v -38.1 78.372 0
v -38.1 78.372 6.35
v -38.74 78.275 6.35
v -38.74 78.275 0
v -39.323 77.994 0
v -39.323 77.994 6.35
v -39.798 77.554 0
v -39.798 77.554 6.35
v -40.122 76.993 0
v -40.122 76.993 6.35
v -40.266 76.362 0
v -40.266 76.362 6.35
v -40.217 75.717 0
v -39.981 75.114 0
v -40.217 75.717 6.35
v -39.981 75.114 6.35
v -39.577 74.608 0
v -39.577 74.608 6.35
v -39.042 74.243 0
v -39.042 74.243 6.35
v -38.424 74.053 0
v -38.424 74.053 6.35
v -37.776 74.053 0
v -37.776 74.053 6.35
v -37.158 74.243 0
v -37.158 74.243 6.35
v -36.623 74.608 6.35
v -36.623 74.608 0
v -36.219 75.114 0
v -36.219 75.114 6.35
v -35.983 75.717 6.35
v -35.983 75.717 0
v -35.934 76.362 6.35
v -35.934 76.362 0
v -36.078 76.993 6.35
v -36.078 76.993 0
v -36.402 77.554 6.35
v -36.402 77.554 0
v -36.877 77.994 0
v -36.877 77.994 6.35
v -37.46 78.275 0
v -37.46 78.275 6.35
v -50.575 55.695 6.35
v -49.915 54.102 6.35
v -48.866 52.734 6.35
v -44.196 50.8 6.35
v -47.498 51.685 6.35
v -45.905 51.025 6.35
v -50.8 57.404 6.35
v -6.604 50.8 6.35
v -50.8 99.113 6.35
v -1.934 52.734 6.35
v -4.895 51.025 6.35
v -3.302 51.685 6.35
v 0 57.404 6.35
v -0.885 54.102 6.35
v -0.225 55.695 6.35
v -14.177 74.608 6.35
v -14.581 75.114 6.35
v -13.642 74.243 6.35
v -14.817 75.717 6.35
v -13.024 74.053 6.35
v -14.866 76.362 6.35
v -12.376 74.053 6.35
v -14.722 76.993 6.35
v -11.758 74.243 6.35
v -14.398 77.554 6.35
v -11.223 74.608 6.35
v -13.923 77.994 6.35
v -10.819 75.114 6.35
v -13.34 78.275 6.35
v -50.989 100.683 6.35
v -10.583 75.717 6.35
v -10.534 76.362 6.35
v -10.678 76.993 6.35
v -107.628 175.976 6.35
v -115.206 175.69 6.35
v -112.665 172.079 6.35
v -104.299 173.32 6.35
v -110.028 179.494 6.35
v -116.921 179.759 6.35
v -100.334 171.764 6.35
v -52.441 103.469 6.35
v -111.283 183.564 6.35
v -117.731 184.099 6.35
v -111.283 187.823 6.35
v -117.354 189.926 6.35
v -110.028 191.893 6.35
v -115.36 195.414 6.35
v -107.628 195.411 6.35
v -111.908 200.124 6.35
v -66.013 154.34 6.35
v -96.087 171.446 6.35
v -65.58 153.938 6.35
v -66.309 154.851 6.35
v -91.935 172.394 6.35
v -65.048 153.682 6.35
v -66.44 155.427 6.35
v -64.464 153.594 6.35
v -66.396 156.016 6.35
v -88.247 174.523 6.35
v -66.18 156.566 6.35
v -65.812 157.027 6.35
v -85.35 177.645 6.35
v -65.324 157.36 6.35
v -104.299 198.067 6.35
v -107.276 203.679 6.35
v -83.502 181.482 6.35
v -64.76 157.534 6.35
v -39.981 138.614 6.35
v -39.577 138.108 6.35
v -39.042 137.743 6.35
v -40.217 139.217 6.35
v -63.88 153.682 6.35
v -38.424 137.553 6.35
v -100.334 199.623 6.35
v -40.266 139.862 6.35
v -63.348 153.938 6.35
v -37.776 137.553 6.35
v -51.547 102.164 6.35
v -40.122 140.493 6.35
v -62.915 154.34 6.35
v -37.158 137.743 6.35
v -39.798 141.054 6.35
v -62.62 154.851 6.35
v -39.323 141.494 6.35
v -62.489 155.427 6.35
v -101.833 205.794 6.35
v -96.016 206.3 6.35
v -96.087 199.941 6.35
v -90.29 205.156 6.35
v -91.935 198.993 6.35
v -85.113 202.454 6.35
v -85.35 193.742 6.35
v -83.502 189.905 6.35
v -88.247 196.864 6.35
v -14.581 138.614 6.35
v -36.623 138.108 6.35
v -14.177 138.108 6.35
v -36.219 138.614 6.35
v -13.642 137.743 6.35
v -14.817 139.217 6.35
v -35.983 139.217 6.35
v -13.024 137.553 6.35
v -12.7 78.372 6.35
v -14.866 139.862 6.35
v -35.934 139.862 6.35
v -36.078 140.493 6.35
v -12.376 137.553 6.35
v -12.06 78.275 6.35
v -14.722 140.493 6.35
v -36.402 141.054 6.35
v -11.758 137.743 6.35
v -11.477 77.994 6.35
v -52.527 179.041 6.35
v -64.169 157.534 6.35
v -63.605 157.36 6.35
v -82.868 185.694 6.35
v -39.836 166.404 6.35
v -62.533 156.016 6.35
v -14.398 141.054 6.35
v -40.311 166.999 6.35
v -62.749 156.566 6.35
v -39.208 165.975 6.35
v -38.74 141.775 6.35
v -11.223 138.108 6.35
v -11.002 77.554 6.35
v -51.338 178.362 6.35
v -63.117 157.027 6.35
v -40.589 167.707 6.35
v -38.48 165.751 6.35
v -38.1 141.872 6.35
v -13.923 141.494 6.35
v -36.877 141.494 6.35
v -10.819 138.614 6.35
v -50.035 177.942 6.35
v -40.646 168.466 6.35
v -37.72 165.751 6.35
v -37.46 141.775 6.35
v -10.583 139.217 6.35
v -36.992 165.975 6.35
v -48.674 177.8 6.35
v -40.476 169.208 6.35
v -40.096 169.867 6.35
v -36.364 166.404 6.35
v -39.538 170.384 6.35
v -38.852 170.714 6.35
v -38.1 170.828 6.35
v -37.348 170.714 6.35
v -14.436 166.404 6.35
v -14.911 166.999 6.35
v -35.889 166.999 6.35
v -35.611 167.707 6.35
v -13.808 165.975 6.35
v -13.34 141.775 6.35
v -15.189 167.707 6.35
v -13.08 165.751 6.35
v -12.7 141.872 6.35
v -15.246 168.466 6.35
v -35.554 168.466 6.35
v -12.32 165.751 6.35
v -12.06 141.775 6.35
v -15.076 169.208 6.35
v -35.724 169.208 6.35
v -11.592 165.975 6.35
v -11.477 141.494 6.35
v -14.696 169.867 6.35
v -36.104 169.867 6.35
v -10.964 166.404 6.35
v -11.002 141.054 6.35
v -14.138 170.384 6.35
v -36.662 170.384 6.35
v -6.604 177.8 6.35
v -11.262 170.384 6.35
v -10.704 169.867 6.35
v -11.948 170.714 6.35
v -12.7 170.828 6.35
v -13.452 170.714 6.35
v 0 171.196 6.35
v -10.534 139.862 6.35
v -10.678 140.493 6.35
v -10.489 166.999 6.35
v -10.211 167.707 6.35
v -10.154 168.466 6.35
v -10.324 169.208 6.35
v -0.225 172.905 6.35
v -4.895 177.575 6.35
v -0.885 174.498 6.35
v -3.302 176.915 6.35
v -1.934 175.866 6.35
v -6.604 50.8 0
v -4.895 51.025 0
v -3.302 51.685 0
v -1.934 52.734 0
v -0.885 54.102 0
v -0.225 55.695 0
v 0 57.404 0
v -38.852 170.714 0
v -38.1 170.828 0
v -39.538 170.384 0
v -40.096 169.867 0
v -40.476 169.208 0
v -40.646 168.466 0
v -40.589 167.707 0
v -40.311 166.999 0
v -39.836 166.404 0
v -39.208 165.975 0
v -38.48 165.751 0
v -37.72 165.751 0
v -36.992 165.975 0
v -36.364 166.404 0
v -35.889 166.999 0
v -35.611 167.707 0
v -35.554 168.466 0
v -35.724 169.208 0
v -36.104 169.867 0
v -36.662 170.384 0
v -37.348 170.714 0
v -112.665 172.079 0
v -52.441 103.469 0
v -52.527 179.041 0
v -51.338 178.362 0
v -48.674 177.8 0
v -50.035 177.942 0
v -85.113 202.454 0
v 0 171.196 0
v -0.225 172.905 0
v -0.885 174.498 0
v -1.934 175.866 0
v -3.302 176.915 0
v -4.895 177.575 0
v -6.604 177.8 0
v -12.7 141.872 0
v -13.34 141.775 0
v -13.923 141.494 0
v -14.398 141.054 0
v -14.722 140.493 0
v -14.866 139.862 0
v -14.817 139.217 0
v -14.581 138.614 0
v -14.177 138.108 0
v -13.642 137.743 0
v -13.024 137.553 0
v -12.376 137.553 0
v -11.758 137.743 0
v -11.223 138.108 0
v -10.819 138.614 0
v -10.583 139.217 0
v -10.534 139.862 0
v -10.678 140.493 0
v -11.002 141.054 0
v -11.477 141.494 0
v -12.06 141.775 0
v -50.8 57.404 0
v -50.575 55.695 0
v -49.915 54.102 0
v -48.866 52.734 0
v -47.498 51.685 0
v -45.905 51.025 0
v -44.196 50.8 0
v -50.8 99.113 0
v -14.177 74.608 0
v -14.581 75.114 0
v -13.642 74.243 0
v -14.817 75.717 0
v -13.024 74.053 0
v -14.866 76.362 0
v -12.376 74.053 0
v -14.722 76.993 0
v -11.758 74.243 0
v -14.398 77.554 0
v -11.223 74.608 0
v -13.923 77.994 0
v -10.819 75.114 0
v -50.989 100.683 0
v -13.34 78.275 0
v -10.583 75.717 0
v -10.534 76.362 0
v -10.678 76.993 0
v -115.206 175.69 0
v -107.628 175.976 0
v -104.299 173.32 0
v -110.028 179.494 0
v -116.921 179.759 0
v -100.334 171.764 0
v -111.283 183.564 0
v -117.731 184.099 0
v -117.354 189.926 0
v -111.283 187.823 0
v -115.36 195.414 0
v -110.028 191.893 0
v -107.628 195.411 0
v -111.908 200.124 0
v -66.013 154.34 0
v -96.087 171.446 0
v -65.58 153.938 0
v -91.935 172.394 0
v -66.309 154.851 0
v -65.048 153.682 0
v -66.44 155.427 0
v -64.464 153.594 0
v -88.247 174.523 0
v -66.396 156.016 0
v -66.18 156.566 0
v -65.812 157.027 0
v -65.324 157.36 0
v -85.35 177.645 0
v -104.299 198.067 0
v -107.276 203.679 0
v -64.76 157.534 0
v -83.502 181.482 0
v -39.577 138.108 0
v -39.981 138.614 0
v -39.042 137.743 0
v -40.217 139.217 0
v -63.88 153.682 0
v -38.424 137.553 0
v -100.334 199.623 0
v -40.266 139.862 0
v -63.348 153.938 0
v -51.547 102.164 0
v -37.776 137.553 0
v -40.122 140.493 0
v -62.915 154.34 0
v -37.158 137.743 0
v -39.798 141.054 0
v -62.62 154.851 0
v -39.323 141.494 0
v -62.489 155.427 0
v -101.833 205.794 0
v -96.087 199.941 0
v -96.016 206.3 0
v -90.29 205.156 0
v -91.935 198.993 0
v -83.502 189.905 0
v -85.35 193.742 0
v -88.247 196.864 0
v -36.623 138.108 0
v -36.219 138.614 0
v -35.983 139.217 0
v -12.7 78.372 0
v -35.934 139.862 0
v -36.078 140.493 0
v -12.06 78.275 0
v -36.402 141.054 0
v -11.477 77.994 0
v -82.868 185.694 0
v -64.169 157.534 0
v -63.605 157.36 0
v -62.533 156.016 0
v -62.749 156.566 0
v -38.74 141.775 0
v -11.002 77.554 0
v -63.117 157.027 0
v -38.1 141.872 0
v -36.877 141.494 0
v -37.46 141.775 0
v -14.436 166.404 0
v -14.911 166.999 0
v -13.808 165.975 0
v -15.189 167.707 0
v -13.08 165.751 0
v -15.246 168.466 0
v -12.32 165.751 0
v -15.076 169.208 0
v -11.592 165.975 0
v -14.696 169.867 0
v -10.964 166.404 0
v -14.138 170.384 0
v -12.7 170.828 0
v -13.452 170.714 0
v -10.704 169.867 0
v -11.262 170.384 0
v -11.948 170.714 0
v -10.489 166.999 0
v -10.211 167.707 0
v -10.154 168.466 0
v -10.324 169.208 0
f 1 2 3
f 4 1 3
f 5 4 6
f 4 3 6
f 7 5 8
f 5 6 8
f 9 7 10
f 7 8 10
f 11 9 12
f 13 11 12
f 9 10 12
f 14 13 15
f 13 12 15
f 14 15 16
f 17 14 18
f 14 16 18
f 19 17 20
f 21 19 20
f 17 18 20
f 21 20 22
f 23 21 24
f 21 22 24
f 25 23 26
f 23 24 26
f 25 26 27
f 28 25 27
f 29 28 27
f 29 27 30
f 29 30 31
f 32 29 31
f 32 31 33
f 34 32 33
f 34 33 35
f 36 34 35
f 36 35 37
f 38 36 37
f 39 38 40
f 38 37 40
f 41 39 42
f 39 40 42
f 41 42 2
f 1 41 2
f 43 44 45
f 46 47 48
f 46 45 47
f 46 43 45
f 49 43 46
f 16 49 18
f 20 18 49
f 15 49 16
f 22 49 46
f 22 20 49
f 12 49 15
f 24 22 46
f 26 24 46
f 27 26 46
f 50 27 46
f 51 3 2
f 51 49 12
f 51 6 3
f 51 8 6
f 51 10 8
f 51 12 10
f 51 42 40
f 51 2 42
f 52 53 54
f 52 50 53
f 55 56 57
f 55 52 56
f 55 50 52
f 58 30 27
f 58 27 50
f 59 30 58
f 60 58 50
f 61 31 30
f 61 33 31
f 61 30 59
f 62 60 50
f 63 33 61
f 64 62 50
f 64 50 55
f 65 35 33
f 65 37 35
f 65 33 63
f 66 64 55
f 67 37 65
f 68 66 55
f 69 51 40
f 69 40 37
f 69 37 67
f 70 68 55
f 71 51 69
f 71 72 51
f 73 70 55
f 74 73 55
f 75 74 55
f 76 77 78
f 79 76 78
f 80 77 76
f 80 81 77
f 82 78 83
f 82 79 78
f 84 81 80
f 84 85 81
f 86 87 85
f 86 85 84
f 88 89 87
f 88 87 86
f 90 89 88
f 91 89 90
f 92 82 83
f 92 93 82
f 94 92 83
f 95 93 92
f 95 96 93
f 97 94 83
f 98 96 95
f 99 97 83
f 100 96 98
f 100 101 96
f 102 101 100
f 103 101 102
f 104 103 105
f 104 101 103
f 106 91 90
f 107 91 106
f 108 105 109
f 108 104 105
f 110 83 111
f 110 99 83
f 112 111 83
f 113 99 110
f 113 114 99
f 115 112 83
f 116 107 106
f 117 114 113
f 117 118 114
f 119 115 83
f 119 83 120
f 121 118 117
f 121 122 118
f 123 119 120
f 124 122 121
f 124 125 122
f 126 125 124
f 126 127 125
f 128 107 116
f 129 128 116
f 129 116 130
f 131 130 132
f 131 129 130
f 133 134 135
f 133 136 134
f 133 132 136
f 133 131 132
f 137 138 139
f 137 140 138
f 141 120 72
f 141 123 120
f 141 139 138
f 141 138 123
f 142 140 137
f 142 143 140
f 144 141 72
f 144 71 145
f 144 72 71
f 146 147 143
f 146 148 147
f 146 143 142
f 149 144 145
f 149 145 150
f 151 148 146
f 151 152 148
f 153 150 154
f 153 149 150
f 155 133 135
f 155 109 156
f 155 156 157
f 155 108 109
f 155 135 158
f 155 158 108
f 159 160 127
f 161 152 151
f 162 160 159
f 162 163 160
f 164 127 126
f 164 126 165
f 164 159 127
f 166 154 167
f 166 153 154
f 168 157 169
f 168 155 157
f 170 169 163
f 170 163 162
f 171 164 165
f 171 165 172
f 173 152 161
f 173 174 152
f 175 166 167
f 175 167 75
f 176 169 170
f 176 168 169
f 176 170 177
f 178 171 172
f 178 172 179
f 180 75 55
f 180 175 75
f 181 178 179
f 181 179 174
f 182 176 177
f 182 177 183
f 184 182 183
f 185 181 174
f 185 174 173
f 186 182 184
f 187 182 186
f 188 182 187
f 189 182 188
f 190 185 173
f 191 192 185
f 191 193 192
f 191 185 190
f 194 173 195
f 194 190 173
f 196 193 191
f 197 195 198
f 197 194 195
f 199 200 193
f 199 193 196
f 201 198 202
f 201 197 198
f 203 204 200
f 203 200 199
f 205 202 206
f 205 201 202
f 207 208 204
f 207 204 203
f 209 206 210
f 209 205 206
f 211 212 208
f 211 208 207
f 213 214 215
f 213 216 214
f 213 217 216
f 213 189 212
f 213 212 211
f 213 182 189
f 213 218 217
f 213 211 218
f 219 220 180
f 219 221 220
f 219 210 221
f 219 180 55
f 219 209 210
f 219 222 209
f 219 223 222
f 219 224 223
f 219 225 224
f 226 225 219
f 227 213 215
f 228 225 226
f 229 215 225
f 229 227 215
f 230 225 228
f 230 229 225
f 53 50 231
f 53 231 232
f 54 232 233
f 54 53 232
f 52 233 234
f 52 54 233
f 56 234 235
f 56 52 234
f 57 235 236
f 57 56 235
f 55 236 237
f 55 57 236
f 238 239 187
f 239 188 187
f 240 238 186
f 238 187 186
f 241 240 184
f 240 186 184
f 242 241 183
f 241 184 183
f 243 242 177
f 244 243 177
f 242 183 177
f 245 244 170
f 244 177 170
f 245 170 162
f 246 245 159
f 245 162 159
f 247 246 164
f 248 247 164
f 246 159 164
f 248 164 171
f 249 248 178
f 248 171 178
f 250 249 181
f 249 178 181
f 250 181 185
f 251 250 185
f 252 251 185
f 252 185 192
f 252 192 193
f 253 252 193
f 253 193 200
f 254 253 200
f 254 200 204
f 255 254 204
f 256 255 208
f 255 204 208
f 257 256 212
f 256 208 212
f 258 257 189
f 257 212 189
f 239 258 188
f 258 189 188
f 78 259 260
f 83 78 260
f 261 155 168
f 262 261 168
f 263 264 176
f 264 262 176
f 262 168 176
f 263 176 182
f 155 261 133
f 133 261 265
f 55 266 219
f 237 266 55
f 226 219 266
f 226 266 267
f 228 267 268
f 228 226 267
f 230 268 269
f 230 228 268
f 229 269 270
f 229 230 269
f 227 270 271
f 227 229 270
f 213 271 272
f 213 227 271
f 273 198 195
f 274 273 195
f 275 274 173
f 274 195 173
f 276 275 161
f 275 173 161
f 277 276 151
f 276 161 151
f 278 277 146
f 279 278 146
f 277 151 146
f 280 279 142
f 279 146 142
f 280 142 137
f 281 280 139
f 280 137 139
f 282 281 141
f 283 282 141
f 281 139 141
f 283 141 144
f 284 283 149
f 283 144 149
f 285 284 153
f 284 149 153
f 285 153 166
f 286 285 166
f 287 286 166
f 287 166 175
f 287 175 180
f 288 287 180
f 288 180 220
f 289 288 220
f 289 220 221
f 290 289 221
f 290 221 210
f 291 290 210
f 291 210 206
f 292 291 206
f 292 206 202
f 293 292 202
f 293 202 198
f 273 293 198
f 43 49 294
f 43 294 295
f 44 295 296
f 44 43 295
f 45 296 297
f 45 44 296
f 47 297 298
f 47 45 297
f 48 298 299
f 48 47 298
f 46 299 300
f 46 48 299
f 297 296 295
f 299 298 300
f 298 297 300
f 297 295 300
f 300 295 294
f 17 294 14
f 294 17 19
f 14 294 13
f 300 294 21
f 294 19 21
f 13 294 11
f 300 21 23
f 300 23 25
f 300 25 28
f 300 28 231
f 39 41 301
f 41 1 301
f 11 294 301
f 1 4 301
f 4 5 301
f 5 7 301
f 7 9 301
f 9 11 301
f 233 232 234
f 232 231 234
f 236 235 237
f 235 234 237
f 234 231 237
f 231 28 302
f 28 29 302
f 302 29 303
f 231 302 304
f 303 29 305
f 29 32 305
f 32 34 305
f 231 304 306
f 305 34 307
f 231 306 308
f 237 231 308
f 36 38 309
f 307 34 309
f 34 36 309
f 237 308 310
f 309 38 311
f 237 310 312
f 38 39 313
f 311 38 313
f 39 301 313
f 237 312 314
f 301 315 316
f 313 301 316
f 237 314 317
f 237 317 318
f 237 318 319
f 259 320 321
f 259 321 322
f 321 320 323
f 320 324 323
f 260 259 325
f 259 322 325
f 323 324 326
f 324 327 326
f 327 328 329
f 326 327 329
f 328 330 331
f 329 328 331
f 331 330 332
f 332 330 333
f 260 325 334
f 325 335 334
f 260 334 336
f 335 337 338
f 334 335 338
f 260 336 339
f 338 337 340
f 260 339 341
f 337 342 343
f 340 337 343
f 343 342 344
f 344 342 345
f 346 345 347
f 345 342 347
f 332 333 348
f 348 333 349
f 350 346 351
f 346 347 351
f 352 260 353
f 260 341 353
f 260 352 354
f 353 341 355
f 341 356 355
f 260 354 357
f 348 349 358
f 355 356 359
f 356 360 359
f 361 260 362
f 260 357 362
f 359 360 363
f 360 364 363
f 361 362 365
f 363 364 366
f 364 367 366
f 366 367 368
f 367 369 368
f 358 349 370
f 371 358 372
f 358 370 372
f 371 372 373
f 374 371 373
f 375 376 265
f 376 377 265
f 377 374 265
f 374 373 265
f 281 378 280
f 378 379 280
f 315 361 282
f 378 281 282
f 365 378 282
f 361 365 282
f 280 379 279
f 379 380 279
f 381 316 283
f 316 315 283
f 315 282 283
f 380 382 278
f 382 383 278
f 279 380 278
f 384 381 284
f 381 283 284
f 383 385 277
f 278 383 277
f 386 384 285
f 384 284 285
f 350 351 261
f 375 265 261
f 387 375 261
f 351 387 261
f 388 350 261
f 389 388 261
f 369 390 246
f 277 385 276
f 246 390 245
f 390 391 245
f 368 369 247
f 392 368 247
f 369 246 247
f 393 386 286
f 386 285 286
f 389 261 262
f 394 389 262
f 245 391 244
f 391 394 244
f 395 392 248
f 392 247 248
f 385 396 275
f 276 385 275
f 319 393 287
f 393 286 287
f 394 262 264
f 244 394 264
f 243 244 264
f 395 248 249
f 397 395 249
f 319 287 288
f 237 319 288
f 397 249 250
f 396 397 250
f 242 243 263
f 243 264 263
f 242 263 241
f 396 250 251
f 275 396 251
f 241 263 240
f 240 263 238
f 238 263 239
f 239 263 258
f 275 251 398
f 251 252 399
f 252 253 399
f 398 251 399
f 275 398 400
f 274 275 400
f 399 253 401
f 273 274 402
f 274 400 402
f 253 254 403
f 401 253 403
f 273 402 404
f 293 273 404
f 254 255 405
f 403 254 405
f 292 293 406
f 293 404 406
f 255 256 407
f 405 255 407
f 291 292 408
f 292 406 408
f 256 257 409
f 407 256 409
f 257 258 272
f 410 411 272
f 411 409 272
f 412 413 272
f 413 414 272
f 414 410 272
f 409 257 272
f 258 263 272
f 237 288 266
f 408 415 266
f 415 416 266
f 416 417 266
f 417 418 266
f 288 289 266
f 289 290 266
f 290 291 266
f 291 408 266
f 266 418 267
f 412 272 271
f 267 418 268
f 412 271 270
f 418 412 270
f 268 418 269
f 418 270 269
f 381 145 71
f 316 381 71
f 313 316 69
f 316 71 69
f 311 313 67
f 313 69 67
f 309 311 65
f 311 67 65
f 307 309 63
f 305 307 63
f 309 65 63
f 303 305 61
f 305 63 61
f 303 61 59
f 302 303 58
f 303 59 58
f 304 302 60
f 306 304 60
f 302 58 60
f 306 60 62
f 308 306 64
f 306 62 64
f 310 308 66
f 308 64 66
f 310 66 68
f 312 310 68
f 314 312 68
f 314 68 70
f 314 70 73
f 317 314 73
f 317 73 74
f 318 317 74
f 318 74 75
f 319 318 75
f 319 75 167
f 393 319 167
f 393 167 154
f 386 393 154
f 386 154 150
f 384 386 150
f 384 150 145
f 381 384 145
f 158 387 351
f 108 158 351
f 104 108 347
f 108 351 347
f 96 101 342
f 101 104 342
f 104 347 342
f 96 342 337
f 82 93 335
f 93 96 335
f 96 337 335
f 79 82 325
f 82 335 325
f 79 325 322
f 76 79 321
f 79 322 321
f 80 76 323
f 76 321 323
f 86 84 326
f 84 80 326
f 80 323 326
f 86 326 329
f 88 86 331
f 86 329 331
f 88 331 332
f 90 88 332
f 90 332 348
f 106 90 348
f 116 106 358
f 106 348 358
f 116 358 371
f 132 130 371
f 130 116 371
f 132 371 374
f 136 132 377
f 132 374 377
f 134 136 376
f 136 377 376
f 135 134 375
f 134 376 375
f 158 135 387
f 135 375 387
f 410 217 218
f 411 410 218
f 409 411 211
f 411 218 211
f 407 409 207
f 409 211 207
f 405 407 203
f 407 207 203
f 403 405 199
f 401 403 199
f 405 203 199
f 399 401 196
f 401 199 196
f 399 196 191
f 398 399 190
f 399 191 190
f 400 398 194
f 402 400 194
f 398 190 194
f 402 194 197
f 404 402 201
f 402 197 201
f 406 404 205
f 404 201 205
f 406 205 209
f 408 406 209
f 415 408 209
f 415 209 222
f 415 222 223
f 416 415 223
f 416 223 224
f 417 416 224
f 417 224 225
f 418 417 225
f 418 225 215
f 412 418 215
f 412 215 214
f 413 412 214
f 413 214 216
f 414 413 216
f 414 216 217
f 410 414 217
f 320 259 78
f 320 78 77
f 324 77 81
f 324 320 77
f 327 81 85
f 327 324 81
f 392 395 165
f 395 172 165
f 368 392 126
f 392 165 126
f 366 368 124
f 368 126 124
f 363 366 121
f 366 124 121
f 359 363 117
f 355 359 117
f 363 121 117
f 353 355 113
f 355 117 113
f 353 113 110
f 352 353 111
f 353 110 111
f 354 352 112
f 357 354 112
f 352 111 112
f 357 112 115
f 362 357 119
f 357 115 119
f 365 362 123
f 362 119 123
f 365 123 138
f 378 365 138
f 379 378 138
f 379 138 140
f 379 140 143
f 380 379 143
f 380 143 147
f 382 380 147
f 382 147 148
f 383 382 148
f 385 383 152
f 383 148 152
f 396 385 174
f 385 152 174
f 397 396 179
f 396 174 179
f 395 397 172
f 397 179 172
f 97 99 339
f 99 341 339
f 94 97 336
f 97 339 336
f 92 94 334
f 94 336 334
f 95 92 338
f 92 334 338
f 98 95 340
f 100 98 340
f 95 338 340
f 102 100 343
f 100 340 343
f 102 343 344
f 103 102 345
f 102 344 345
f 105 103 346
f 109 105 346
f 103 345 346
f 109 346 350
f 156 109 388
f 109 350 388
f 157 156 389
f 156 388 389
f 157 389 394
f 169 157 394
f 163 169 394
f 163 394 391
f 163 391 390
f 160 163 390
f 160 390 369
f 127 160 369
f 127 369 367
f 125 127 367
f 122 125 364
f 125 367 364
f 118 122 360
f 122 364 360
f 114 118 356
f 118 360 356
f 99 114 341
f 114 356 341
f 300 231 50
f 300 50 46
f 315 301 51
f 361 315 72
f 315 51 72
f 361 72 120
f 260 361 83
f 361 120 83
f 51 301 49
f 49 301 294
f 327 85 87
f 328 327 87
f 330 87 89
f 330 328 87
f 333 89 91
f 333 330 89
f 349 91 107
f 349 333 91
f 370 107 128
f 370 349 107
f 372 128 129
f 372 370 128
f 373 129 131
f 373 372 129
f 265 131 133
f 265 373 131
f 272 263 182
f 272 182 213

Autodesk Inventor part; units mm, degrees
ref_plane "YZ Plane" through (0, 0, 0) normal (1, 0, 0) x (0, 1, 0)
ref_plane "XZ Plane" through (0, 0, 0) normal (0, 1, 0) x (-1, 0, 0)
ref_plane "XY Plane" through (0, 0, 0) normal (0, 0, 1) x (1, 0, 0)
sketch "Sketch1" plane through (0, 0, 0) normal (0, 0, 1) x (1, 0, 0)
  line L0 (0, 0) -> (-50.8, 0) construction
  line L1 (-50.8, 0) -> (-50.8, 381) construction
  line L2 (-50.8, 381) -> (0, 381) construction
  line L3 (0, 381) -> (0, 0) construction
  circle A0 centre (-50.8, 431.8) radius 11.1125 construction
  line L4 (-50.8, 353.7099) -> (-298.4703, 0) construction
  line L5 (-298.4703, 0) -> (-267.4626, 0) construction
  line L6 (-267.4626, 0) -> (-50.8, 309.4263) construction
  dimension "d0" = 50.8
  dimension "d1" = 381
  dimension "d2" = 22.225
  dimension "d3" = 431.8
  dimension "d4" = 50.8
  dimension "d5" = 431.8
  dimension "d6" = 25.4
  dimension "d7" = 35
sketch "Sketch2" plane through (0, 0, 0) normal (0, 0, 1) x (1, 0, 0)
  line L0 (-267.4626, 0) -> (-50.8, 309.4263) construction
  line L1 (-50.8, 353.7099) -> (-298.4703, 0) construction
  line L2 (-50.8, 0) -> (-50.8, 381) construction
  line L3 (0, 381) -> (0, 0) construction
  line L4 (-50.8, 381) -> (0, 381) construction
  circle A0 centre (-50.8, 431.8) radius 11.1125 construction
  line L5 (0, 0) -> (-50.8, 0) construction
  line L6 (-298.4703, 0) -> (-267.4626, 0) construction
  circle A1 centre (-88.9, 38.1) radius 30.48 construction
  circle A2 centre (-88.9, 38.1) radius 6.35 construction
  circle A3 centre (-124.3919, 76.2) radius 45.72 construction
  circle A4 centre (-124.3919, 76.2) radius 11.43 construction
  circle A5 centre (-101.6, 129.9906) radius 46.99 construction
  circle A6 centre (-101.6, 129.9906) radius 12.7 construction
  circle A7 centre (-97.155, 185.6935) radius 43.18 construction
  circle A8 centre (-124.3919, 76.2) radius 14.2875
  circle A9 centre (-101.6, 129.9906) radius 14.2875
  circle A10 centre (-97.155, 185.6935) radius 14.2875
  circle A11 centre (-50.8, 431.8) radius 54.5719 construction
  line L7 (-50.8, 177.8) -> (0, 177.8)
  circle A12 centre (-97.155, 185.6935) radius 20.6375 construction
  circle A13 centre (-101.6, 129.9906) radius 20.6375 construction
  circle A14 centre (-124.3919, 76.2) radius 20.6375 construction
  circle A15 centre (-88.9, 38.1) radius 25.4 construction
  line L8 (-50.8, 177.8) -> (-85.1131, 202.4536)
  line L9 (-141.8793, 65.2411) -> (-114.7275, 21.9145)
  line L10 (-74.6041, 11.1805) -> (0, 50.8)
  line L11 (0, 177.8) -> (0, 50.8)
  arc A16 (-141.8226, 87.2489) -> (-117.7308, 184.0988) centre (-275.3417, 171.8837) ccw
  arc A17 (-85.1131, 202.4536) -> (-117.7308, 184.0988) centre (-97.155, 185.6935) ccw
  arc A18 (-141.8226, 87.2489) -> (-141.8793, 65.2411) centre (-124.3919, 76.2) ccw
  arc A19 (-114.7275, 21.9145) -> (-74.6041, 11.1805) centre (-88.9, 38.1) ccw
  line L12 (-38.1, 152.4) -> (-38.1, 127) construction
  line L13 (-40.6527, 152.4) -> (-40.6527, 127)
  line L14 (-35.5473, 127) -> (-35.5473, 152.4)
  arc A20 (-35.5473, 152.4) -> (-40.6527, 152.4) centre (-38.1, 152.4) ccw
  arc A21 (-40.6527, 127) -> (-35.5473, 127) centre (-38.1, 127) ccw
  line L15 (-12.7, 152.4) -> (-12.7, 127) construction
  line L16 (-15.2527, 152.4) -> (-15.2527, 127)
  line L17 (-10.1473, 127) -> (-10.1473, 152.4)
  arc A22 (-10.1473, 152.4) -> (-15.2527, 152.4) centre (-12.7, 152.4) ccw
  arc A23 (-15.2527, 127) -> (-10.1473, 127) centre (-12.7, 127) ccw
  line L18 (-38.1, 139.7) -> (-12.7, 139.7) construction
  line L19 (-38.1, 88.9) -> (-38.1, 63.5) construction
  line L20 (-40.6527, 88.9) -> (-40.6527, 63.5)
  line L21 (-35.5473, 63.5) -> (-35.5473, 88.9)
  arc A24 (-35.5473, 88.9) -> (-40.6527, 88.9) centre (-38.1, 88.9) ccw
  arc A25 (-40.6527, 63.5) -> (-35.5473, 63.5) centre (-38.1, 63.5) ccw
  line L22 (-12.7, 88.9) -> (-12.7, 63.5) construction
  line L23 (-15.2527, 88.9) -> (-15.2527, 63.5)
  line L24 (-10.1473, 63.5) -> (-10.1473, 88.9)
  arc A26 (-10.1473, 88.9) -> (-15.2527, 88.9) centre (-12.7, 88.9) ccw
  arc A27 (-15.2527, 63.5) -> (-10.1473, 63.5) centre (-12.7, 63.5) ccw
  line L25 (-38.1, 76.2) -> (-12.7, 76.2) construction
  circle A28 centre (-88.9, 38.1) radius 10.795
  line L26 (-112.6649, 172.0793) -> (-50.8, 101.6)
  line L27 (-50.8, 101.6) -> (-50.8, 23.822)
  arc A29 (-117.7308, 184.0988) -> (-112.6649, 172.0793) centre (-97.155, 185.6935) ccw
  line L28 (0, 50.8) -> (-50.8, 50.8)
  point P0 (-88.9, 63.5)
  point P1 (-110.897, 50.8)
  point P2 (-110.897, 25.4)
  point P3 (-88.9, 12.7)
  point P4 (-66.903, 25.4)
  point P5 (-66.903, 50.8)
  point P6 (-25.4, 139.7)
  point P7 (-25.4, 177.8)
  point P8 (-25.4, 76.2)
  point P9 (-38.1, 168.275)
  point P10 (-12.7, 168.275)
  dimension "d25" = 50.8
  dimension "d8" = 60.96
  dimension "d9" = 12.7
  dimension "d10" = 91.44
  dimension "d11" = 38.1
  dimension "d12" = 38.1
  dimension "d13" = 22.86
  dimension "d14" = 93.98
  dimension "d15" = 25.4
  dimension "d16" = 86.36
  dimension "d17" = 76.2
  dimension "d20" = 50.8
  dimension "d22" = 28.575
  dimension "d23" = 109.1438
  dimension "d24" = 6.35
  dimension "d28" = 360
  dimension "d30" = 177.8
  dimension "d31" = 50.8
  dimension "d32" = 5.1054
  dimension "d33" = 25.4
  dimension "d34" = 38.1
  dimension "d35" = 25.4
  dimension "d36" = 5.1054
  dimension "d37" = 25.4
  dimension "d38" = 25.4
  dimension "d39" = 63.5
  dimension "d42" = 21.59
  dimension "d50" = 9.525
  dimension "d59" = 46.355
  dimension "d87" = 76.2
extrude "Extrusion1" add sketch "Sketch2" along normal blind 6.35 contours L7 L11 L28 L27 L26 A29 A17 L8 | A20 L14 A21 L13 | A22 L17 A23 L16 | A24 L21 A25 L20 | A26 L24 A27 L23
hole "Hole1" at (-88.9, 63.5, 0) at (-110.897, 50.8, 0) at (-110.897, 25.4, 0) at (-88.9, 12.7, 0) at (-66.903, 25.4, 0) at (-66.903, 50.8, 0) at (-38.1, 168.275, 0) at (-12.7, 168.275, 0) direction (0, 0, 1) diameter 5.1054 end through all clearance for "Flat Head Machine Screw (82)" size "#10" standard "Ansi Unified Screw Threads"
hole "Hole2" at (-12.7, 139.7, 0) at (-38.1, 139.7, 0) at (-38.1, 76.2, 0) at (-12.7, 76.2, 0) direction (0, 0, 1) diameter 4.3434 end through all thread size "12-24 UNC" class "2B" standard "ANSI Unified Screw Threads"
fillet "Fillet1" radius 6.604 3 edges at (-50.8, 177.8, 3.175) (0, 177.8, 3.175) (0, 50.8, 3.175)
sketch "Sketch4" plane through (0, 0, 6.35) normal (0, 0, 1) x (1, 0, 0)
  arc A0 (-6.604, 50.8) -> (0, 57.404) centre (-6.604, 57.404) ccw construction
  line L0 (0, 57.404) -> (0, 171.196) construction
  arc A1 (0, 171.196) -> (-6.604, 177.8) centre (-6.604, 171.196) ccw construction
  line L1 (-6.604, 177.8) -> (-48.6735, 177.8) construction
  arc A2 (-52.5269, 179.0408) -> (-48.6735, 177.8) centre (-48.6735, 184.404) ccw construction
  line L2 (-52.5269, 179.0408) -> (-85.1131, 202.4536) construction
  arc A3 (-85.1131, 202.4536) -> (-112.6649, 172.0793) centre (-97.155, 185.6935) ccw construction
  circle A4 centre (-38.1, 76.2) radius 2.1717 construction
  circle A5 centre (-12.7, 139.7) radius 2.1717 construction
  circle A6 centre (-38.1, 139.7) radius 2.1717 construction
  circle A7 centre (-12.7, 76.2) radius 2.1717 construction
  circle A8 centre (-38.1, 168.275) radius 2.5527 construction
  circle A9 centre (-12.7, 168.275) radius 2.5527 construction
  circle A10 centre (-97.155, 185.6935) radius 14.2875 construction
  line L3 (-112.6649, 172.0793) -> (-50.8, 101.6) projected
  line L4 (-50.8, 101.6) -> (-50.8, 50.8) projected
  line L5 (-50.8, 50.8) -> (-6.604, 50.8) projected
  point P0 (0, 0)
  point P1 (-64.4644, 155.575)
  dimension "d74" = 44.45
  dimension "d75" = 22.225
hole "Hole3" at (-64.4644, 155.575, 6.35) direction (0, 0, -1) diameter 3.9624 end through all thread size "10-32 UNF" class "2B" standard "ANSI Unified Screw Threads"
fillet "Fillet3" radius 6.604 2 edges at (-50.8, 50.8, 3.175) (-50.8, 101.6, 3.175)
sketch "Sketch3" plane through (0, 0, 6.35) normal (0, 0, 1) x (1, 0, 0)
  arc A0 (-3.5066, 48.9378) -> (0, 54.7703) centre (-6.604, 54.7703) ccw construction
  line L0 (0, 54.7703) -> (0, 171.196) construction
  arc A1 (0, 171.196) -> (-6.604, 177.8) centre (-6.604, 171.196) ccw construction
  line L1 (-6.604, 177.8) -> (-48.6735, 177.8) construction
  arc A2 (-52.5269, 179.0408) -> (-48.6735, 177.8) centre (-48.6735, 184.404) ccw construction
  line L2 (-52.5269, 179.0408) -> (-85.1131, 202.4536) construction
  arc A3 (-85.1131, 202.4536) -> (-112.6649, 172.0793) centre (-97.155, 185.6935) ccw construction
  line L3 (-50.8, 23.822) -> (-3.5066, 48.9378) construction
  circle A4 centre (-38.1, 76.2) radius 2.1717 construction
  circle A5 centre (-12.7, 139.7) radius 2.1717 construction
  circle A6 centre (-38.1, 139.7) radius 2.1717 construction
  circle A7 centre (-12.7, 76.2) radius 2.1717 construction
  circle A8 centre (-38.1, 168.275) radius 2.5527 construction
  circle A9 centre (-12.7, 168.275) radius 2.5527 construction
  circle A10 centre (-97.155, 185.6935) radius 14.2875 construction
  arc A11 (-88.8183, 197.2966) -> (-111.3998, 184.5895) centre (-97.155, 185.6935) ccw construction
  line L4 (-88.8183, 197.2966) -> (-56.2321, 173.8838) construction
  arc A12 (-56.2321, 173.8838) -> (-48.6735, 171.45) centre (-48.6735, 184.404) ccw construction
  line L5 (-48.6735, 171.45) -> (-6.604, 171.45) construction
  arc A13 (-6.35, 171.196) -> (-6.604, 171.45) centre (-6.604, 171.196) ccw construction
  line L6 (-6.35, 171.196) -> (-6.35, 54.7703) construction
  arc A14 (-6.4849, 54.546) -> (-6.35, 54.7703) centre (-6.604, 54.7703) ccw
  line L7 (-6.4849, 54.546) -> (-77.5824, 16.7888) construction
  arc A15 (-109.3468, 25.2865) -> (-77.5824, 16.7888) centre (-88.9, 38.1) ccw construction
  line L8 (-109.3468, 25.2865) -> (-136.4985, 68.613) construction
  arc A16 (-136.4593, 83.8492) -> (-136.4985, 68.613) centre (-124.3919, 76.2) ccw construction
  arc A17 (-136.4593, 83.8492) -> (-111.3998, 184.5895) centre (-275.3417, 171.8837) ccw construction
  circle A18 centre (-97.155, 185.6935) radius 20.6375 construction
  circle A19 centre (-38.1, 168.275) radius 8.9027 construction
  circle A20 centre (-101.6, 129.9906) radius 20.6375 construction
  circle A21 centre (-124.3919, 76.2) radius 20.6375 construction
  circle A22 centre (-88.9, 63.5) radius 2.5527 construction
  circle A23 centre (-88.9, 63.5) radius 8.9027 construction
  circle A24 centre (-66.903, 50.8) radius 8.9027 construction
  circle A25 centre (-38.1, 76.2) radius 8.9027 construction
  circle A26 centre (-12.7, 76.2) radius 2.1717 construction
  circle A27 centre (-12.7, 76.2) radius 8.9027 construction
  circle A28 centre (-38.1, 139.7) radius 8.9027 construction
  circle A29 centre (-12.7, 139.7) radius 2.1717 construction
  circle A30 centre (-12.7, 139.7) radius 8.9027 construction
  circle A31 centre (-12.7, 168.275) radius 2.5527 construction
  circle A32 centre (-12.7, 168.275) radius 8.9027 construction
  circle A33 centre (-38.1, 139.7) radius 2.1717 construction
  line L9 (-101.6, 129.9906) -> (-38.1, 139.7) construction
  circle A34 centre (-38.1, 76.2) radius 2.1717 construction
  line L10 (-38.1, 139.7) -> (-38.1, 76.2) construction
  line L11 (-38.1, 76.2) -> (-66.903, 50.8) construction
  line L12 (-66.903, 50.8) -> (-88.9, 63.5) construction
  line L13 (-88.9, 63.5) -> (-124.3919, 76.2) construction
  circle A35 centre (-38.1, 168.275) radius 2.5527 construction
  line L14 (-38.1, 139.7) -> (-38.1, 168.275) construction
  line L15 (-38.1, 107.95) -> (-6.35, 107.95) construction
  line L16 (-55.1495, 28.702) -> (-62.7133, 42.9448) construction
  line L17 (-101.1201, 126.852) -> (-41.275, 136.0026) construction
  line L18 (-41.275, 136.0026) -> (-41.275, 77.6333) construction
  line L19 (-41.275, 77.6333) -> (-67.2915, 54.6905) construction
  line L20 (-67.2915, 54.6905) -> (-87.5606, 66.3929) construction
  line L21 (-87.5606, 66.3929) -> (-123.3222, 79.1894) construction
  line L22 (-102.0799, 133.1291) -> (-34.925, 143.3974) construction
  line L23 (-34.925, 143.3974) -> (-34.925, 74.7667) construction
  line L24 (-34.925, 74.7667) -> (-66.5144, 46.9095) construction
  line L25 (-66.5144, 46.9095) -> (-90.2394, 60.6071) construction
  line L26 (-90.2394, 60.6071) -> (-125.4616, 73.2106) construction
  line L27 (-34.925, 139.7) -> (-34.925, 168.275) construction
  line L28 (-41.275, 139.7) -> (-41.275, 168.275) construction
  line L29 (-38.1, 111.125) -> (-6.35, 111.125) construction
  line L30 (-38.1, 104.775) -> (-6.35, 104.775) construction
  line L31 (-76.7242, 188.6072) -> (-56.2321, 173.8838)
  line L32 (-48.6735, 171.45) -> (-46.4173, 171.45)
  line L33 (-29.7827, 171.45) -> (-21.0173, 171.45)
  line L34 (-6.35, 162.0352) -> (-6.35, 145.9398)
  line L35 (-34.925, 159.9577) -> (-34.925, 148.0173)
  line L36 (-41.275, 159.9577) -> (-41.275, 148.0173)
  line L37 (-34.925, 131.3827) -> (-34.925, 84.5173)
  line L38 (-41.275, 131.3827) -> (-41.275, 84.5173)
  line L39 (-6.35, 133.4602) -> (-6.35, 82.4398)
  line L40 (-6.35, 69.9602) -> (-6.35, 54.7703)
  line L41 (-6.4849, 54.546) -> (-55.1495, 28.702)
  line L42 (-55.1495, 28.702) -> (-62.7133, 42.9448)
  line L43 (-58.5648, 53.9198) -> (-42.2382, 68.3175)
  line L44 (-46.4381, 73.0802) -> (-62.7648, 58.6825)
  line L45 (-72.5184, 57.7083) -> (-80.1095, 62.091)
  line L46 (-95.6614, 69.2915) -> (-104.1226, 72.3192)
  line L47 (-45.8418, 135.3043) -> (-80.9626, 129.9342)
  line L48 (-46.8016, 141.5814) -> (-81.9224, 136.2113)
  line L49 (-6.35, 111.125) -> (-34.925, 111.125)
  line L50 (-34.925, 104.775) -> (-6.35, 104.775)
  arc A36 (-110.9157, 170.3133) -> (-76.7242, 188.6072) centre (-97.155, 185.6935) ccw
  arc A37 (-81.9224, 136.2113) -> (-112.7474, 147.3584) centre (-101.6, 129.9906) ccw
  arc A38 (-119.4378, 119.6117) -> (-80.9626, 129.9342) centre (-101.6, 129.9906) ccw
  arc A39 (-104.1226, 72.3192) -> (-129.3429, 96.2348) centre (-124.3919, 76.2) ccw
  arc A40 (-80.1095, 62.091) -> (-95.6614, 69.2915) centre (-88.9, 63.5) ccw
  arc A41 (-62.7648, 58.6825) -> (-72.5184, 57.7083) centre (-66.903, 50.8) ccw
  arc A42 (-62.7133, 42.9448) -> (-58.5648, 53.9198) centre (-66.903, 50.8) ccw
  arc A43 (-41.275, 84.5173) -> (-46.4381, 73.0802) centre (-38.1, 76.2) ccw
  arc A44 (-42.2382, 68.3175) -> (-34.925, 84.5173) centre (-38.1, 76.2) ccw
  arc A45 (-6.35, 82.4398) -> (-6.35, 69.9602) centre (-12.7, 76.2) ccw
  arc A46 (-45.8418, 135.3043) -> (-41.275, 131.3827) centre (-38.1, 139.7) ccw
  arc A47 (-6.35, 145.9398) -> (-6.35, 133.4602) centre (-12.7, 139.7) ccw
  arc A48 (-41.275, 148.0173) -> (-46.8016, 141.5814) centre (-38.1, 139.7) ccw
  arc A49 (-34.925, 131.3827) -> (-34.925, 148.0173) centre (-38.1, 139.7) ccw
  arc A50 (-46.4173, 171.45) -> (-41.275, 159.9577) centre (-38.1, 168.275) ccw
  arc A51 (-34.925, 159.9577) -> (-29.7827, 171.45) centre (-38.1, 168.275) ccw
  arc A52 (-21.0173, 171.45) -> (-6.35, 162.0352) centre (-12.7, 168.275) ccw
  arc A53 (-56.2321, 173.8838) -> (-48.6735, 171.45) centre (-48.6735, 184.404) ccw
  arc A54 (-112.7474, 147.3584) -> (-110.9157, 170.3133) centre (-275.3417, 171.8837) ccw
  arc A55 (-129.3429, 96.2348) -> (-119.4378, 119.6117) centre (-275.3417, 171.8837) ccw
  circle A56 centre (-64.4644, 155.575) radius 1.9812 construction
  circle A57 centre (-64.4644, 155.575) radius 1.9812 construction
  circle A58 centre (-64.4644, 155.575) radius 8.9027 construction
  line L51 (-97.155, 185.6935) -> (-64.4644, 155.575) construction
  line L52 (-64.4644, 155.575) -> (-38.1, 168.275) construction
  line L53 (-95.0037, 188.0285) -> (-63.8992, 159.3714) construction
  line L54 (-63.8992, 159.3714) -> (-39.4779, 171.1354) construction
  line L55 (-36.7221, 165.4146) -> (-65.0295, 151.7786) construction
  line L56 (-65.0295, 151.7786) -> (-99.3063, 183.3585) construction
  line L57 (-46.9711, 167.5259) -> (-58.349, 162.045)
  line L58 (-44.2153, 161.805) -> (-55.5932, 156.3241)
  line L59 (-72.7326, 158.8756) -> (-84.3092, 169.5413)
  line L60 (-80.0066, 174.2114) -> (-68.43, 163.5457)
  arc A59 (-58.349, 162.045) -> (-68.43, 163.5457) centre (-64.4644, 155.575) ccw
  arc A60 (-72.7326, 158.8756) -> (-55.5932, 156.3241) centre (-64.4644, 155.575) ccw
  line L61 (-112.6649, 172.0793) -> (-50.8, 101.6) projected
  line L62 (-50.8, 101.6) -> (-50.8, 23.822) projected
  point P0 (0, 0)
  point P1 (-6.35, 104.775)
  dimension "d61" = 6.35
  dimension "d62" = 6.35
  dimension "d63" = 25.4
  dimension "d64" = 3.175
  dimension "d65" = 3.175
  dimension "d66" = 3.175
  dimension "d67" = 3.175
  dimension "d68" = 3.175
  dimension "d69" = 3.175
  dimension "d83" = 3.175
  dimension "d84" = 3.175
properties part number "CL7-GB-008" material "Aluminum 6061"
